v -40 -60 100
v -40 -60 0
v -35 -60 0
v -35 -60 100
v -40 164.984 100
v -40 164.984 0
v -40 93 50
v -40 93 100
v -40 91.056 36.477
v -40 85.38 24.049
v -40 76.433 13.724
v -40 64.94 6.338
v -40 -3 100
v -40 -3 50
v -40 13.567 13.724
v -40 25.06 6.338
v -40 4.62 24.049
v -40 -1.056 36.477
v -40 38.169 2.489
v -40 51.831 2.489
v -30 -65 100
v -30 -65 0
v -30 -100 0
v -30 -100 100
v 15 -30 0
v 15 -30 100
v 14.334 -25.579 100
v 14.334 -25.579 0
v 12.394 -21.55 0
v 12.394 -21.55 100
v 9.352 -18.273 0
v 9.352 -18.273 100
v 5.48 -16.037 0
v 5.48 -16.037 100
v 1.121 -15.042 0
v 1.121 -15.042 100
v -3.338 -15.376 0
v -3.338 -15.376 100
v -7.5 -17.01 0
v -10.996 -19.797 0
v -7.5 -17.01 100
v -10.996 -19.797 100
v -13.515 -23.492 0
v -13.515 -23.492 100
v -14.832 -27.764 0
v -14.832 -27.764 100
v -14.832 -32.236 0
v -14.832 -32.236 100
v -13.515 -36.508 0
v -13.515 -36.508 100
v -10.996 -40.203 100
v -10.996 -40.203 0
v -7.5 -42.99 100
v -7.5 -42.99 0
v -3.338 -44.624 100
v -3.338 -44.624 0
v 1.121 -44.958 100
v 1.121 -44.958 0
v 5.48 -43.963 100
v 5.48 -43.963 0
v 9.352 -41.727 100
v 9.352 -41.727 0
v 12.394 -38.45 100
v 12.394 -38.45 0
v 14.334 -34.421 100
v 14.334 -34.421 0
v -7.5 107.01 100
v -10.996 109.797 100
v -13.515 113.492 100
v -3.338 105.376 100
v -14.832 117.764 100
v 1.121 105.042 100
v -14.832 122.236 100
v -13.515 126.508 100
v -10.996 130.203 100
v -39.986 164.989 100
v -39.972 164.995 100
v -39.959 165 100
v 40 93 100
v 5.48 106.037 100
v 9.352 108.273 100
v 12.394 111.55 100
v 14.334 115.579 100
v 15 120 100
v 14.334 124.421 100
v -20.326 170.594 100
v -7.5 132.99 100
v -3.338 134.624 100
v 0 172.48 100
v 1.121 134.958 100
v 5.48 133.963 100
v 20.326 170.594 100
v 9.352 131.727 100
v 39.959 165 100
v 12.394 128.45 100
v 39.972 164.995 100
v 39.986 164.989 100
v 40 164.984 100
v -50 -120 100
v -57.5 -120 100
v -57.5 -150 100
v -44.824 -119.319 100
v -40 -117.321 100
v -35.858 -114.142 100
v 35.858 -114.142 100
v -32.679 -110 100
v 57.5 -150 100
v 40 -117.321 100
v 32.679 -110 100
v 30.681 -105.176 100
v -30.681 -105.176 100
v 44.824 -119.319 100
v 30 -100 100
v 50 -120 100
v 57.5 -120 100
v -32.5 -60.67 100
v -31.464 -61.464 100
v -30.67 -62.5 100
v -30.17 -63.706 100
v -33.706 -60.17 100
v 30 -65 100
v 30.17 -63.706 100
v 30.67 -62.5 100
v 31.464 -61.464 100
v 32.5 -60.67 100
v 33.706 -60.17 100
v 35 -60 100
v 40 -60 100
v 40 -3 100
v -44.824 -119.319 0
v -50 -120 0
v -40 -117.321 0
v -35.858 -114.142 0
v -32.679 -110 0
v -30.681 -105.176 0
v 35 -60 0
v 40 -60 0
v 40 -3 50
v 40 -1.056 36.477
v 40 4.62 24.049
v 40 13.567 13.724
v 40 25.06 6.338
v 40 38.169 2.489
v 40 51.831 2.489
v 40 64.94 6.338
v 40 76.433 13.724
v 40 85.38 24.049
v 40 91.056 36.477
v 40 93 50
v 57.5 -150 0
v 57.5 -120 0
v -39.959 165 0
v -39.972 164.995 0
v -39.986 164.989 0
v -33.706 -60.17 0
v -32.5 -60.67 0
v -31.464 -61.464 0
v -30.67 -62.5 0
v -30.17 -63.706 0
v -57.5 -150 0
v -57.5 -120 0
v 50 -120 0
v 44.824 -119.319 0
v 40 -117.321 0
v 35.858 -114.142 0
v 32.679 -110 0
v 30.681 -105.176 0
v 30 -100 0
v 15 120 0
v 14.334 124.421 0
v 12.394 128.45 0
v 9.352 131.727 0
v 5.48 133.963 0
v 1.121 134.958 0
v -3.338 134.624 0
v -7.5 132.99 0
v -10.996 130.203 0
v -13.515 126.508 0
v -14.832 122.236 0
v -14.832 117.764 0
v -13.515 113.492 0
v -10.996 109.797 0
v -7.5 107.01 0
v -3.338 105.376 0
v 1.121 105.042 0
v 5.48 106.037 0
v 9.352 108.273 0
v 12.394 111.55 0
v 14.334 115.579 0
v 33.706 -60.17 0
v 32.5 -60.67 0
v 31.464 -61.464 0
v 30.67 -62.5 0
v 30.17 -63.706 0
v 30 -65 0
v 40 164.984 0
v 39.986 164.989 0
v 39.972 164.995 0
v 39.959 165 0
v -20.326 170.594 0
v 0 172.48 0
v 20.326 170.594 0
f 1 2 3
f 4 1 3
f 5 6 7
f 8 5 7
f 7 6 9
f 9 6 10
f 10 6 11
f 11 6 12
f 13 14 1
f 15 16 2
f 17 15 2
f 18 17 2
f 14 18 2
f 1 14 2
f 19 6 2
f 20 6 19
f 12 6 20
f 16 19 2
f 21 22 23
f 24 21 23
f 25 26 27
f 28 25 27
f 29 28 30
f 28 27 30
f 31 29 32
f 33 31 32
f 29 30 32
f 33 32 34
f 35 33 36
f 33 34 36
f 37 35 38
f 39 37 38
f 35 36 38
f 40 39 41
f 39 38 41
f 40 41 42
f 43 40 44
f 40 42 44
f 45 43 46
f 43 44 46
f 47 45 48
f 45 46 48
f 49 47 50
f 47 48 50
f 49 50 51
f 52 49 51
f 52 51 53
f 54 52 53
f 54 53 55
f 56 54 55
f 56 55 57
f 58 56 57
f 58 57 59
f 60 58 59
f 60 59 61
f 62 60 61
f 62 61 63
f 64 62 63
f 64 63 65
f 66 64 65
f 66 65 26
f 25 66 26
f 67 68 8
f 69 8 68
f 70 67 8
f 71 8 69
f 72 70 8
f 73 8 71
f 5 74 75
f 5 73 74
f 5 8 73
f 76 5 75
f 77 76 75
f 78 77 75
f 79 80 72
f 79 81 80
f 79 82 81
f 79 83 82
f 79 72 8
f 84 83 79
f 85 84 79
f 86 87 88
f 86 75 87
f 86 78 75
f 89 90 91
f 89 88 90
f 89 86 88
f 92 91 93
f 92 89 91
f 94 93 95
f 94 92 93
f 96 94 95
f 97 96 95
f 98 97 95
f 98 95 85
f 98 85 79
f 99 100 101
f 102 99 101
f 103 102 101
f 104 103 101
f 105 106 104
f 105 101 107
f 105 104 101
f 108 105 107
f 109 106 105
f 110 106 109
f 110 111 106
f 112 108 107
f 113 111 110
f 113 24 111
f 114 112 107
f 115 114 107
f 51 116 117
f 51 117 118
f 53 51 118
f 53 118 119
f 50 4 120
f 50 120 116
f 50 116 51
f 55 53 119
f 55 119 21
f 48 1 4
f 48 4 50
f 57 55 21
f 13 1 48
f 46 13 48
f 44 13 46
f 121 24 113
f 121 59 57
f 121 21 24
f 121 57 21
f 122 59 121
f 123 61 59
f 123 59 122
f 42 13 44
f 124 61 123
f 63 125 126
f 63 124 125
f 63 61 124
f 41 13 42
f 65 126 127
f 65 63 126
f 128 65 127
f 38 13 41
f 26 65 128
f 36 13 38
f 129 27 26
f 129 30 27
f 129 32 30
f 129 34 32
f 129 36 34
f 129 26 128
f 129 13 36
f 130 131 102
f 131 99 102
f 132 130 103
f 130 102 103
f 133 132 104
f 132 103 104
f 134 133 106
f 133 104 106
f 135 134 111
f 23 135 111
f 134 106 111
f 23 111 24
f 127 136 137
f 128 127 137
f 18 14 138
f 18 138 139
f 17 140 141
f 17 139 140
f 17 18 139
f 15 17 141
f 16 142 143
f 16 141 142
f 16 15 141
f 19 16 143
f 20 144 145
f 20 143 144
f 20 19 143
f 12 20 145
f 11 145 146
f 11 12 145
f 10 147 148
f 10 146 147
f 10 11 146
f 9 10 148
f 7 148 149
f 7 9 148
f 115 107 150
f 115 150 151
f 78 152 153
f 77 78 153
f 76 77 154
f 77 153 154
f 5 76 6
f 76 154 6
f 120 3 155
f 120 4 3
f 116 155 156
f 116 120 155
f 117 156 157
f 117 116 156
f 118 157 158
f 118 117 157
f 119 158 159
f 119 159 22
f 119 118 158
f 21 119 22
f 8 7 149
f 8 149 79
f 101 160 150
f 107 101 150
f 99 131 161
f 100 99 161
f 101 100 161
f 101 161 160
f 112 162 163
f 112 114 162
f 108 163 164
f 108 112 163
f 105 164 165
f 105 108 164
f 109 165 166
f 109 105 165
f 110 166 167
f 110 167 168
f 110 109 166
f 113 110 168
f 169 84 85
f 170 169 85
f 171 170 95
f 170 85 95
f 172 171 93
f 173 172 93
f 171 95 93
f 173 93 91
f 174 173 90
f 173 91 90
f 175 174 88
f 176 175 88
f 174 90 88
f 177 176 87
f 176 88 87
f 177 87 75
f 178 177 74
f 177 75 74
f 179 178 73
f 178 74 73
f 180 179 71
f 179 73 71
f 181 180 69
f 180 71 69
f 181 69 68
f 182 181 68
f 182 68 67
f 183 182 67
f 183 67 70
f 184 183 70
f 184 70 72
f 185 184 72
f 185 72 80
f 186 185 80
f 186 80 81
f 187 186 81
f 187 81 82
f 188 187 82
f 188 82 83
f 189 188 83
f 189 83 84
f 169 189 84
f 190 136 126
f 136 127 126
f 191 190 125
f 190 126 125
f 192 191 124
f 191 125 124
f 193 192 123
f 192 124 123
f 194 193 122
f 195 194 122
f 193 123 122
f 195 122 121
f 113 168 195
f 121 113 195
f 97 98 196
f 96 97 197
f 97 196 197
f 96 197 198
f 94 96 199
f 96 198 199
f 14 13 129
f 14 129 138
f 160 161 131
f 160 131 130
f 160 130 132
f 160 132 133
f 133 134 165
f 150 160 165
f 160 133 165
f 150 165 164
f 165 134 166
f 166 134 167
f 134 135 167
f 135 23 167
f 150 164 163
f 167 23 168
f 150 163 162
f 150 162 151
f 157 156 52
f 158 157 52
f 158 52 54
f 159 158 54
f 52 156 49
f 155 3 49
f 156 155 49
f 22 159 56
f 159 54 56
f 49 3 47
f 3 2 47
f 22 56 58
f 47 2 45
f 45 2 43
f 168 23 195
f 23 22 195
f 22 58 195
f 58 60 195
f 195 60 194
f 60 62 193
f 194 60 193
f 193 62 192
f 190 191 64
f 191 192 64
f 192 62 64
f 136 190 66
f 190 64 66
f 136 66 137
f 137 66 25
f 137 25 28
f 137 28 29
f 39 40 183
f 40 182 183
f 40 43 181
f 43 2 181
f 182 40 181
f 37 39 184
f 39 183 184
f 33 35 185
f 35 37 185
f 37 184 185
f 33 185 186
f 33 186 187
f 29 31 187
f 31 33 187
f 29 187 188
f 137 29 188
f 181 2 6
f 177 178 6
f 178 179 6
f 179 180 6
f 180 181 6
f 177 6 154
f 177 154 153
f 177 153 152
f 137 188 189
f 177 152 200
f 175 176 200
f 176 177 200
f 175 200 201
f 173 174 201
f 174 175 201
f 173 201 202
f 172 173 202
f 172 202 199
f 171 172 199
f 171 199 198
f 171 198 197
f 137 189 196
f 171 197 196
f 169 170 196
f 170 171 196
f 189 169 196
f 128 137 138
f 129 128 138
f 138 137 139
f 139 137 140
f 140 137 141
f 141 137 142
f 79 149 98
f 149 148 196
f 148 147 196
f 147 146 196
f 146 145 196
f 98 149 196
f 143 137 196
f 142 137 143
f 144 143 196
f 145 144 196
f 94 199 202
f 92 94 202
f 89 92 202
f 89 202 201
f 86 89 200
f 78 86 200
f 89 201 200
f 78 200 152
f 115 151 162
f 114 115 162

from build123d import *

# Parameters (mm, degrees)
BOSS_EXTRUDE1_DEPTH     = 100
FILLET1_R               = 5
FILLET2_R               = 5
FILLET3_R               = 20
FILLET4_R               = 20
SKETCH5_R               = 15
CUT_EXTRUDE1_DEPTH      = 208.498638182
SKETCH16_R              = 15
CUT_EXTRUDE5_DEPTH      = 208.498638182
CUT_EXTRUDE8_DEPTH      = 208.498638182
CUT_EXTRUDE8_DEPTH_BACK = 208.498638182


with BuildPart() as part:
    # Sketch4 → Boss-Extrude1 (new body)
    with BuildSketch(Plane.XY):
        with BuildLine():
            Line((-40, -60), (-30, -60))
            Line((-30, -60), (0, -60))
            Line((0, -60), (30, -60))
            Line((30, -60), (40, -60))
            Line((40, -60), (40, 164.983908243))
            ThreePointArc((40, 164.983908243), (39.979276225, 164.991956207), (39.958550831, 165))
            ThreePointArc((39.958550831, 165), (0, 172.480244803), (-39.958550831, 165))
            ThreePointArc((-39.958550831, 165), (-39.979276225, 164.991956207), (-40, 164.983908243))
            Line((-40, 164.983908243), (-40, -60))
        make_face()
        Polygon((-30, -60), (-30, -105), (0, -105), (30, -105), (30, -60), (0, -60), align=None)
        Polygon((57.5, -120), (-57.5, -120), (-57.5, -150), (0, -150), (57.5, -150), align=None)
        Polygon((0, -105), (-30, -105), (-30, -120), (30, -120), (30, -105), align=None)
    extrude(amount=BOSS_EXTRUDE1_DEPTH)

    # Fillet1
    fillet1_edges = [part.edges().sort_by_distance(p)[0] for p in [
        (-30, -60, 50),
    ]]
    fillet(fillet1_edges, radius=FILLET1_R)

    # Fillet2
    fillet2_edges = [part.edges().sort_by_distance(p)[0] for p in [
        (30, -60, 50),
    ]]
    fillet(fillet2_edges, radius=FILLET2_R)

    # Fillet3
    fillet3_edges = [part.edges().sort_by_distance(p)[0] for p in [
        (-30, -120, 50),
    ]]
    fillet(fillet3_edges, radius=FILLET3_R)

    # Fillet4
    fillet4_edges = [part.edges().sort_by_distance(p)[0] for p in [
        (30, -120, 50),
    ]]
    fillet(fillet4_edges, radius=FILLET4_R)

    # Sketch5 → Cut-Extrude1 (cut, through all)
    with BuildSketch(Plane.XY.offset(100)):
        with Locations((0, 120)):
            Circle(SKETCH5_R)
    extrude(amount=-CUT_EXTRUDE1_DEPTH, mode=Mode.SUBTRACT)

    # Sketch16 → Cut-Extrude5 (cut, through all)
    with BuildSketch(Plane.XY.offset(100)):
        with Locations((0, -30)):
            Circle(SKETCH16_R)
    extrude(amount=-CUT_EXTRUDE5_DEPTH, mode=Mode.SUBTRACT)

    # Sketch19 → Cut-Extrude8 (cut, two sides: drawn at the far end of the back side and taken through both)
    with BuildSketch(Plane(origin=(0, 0, 0), x_dir=(0, 0, -1), z_dir=(1, 0, 0)).offset(-CUT_EXTRUDE8_DEPTH_BACK)):
        with BuildLine():
            Line((-50, 93), (-100, 93))
            Line((-100, 93), (-100, -3))
            Line((-100, -3), (-50, -3))
            ThreePointArc((-50, -3), (-2, 45), (-50, 93))
        make_face()
    extrude(amount=CUT_EXTRUDE8_DEPTH + CUT_EXTRUDE8_DEPTH_BACK, mode=Mode.SUBTRACT)


solid = part.part
